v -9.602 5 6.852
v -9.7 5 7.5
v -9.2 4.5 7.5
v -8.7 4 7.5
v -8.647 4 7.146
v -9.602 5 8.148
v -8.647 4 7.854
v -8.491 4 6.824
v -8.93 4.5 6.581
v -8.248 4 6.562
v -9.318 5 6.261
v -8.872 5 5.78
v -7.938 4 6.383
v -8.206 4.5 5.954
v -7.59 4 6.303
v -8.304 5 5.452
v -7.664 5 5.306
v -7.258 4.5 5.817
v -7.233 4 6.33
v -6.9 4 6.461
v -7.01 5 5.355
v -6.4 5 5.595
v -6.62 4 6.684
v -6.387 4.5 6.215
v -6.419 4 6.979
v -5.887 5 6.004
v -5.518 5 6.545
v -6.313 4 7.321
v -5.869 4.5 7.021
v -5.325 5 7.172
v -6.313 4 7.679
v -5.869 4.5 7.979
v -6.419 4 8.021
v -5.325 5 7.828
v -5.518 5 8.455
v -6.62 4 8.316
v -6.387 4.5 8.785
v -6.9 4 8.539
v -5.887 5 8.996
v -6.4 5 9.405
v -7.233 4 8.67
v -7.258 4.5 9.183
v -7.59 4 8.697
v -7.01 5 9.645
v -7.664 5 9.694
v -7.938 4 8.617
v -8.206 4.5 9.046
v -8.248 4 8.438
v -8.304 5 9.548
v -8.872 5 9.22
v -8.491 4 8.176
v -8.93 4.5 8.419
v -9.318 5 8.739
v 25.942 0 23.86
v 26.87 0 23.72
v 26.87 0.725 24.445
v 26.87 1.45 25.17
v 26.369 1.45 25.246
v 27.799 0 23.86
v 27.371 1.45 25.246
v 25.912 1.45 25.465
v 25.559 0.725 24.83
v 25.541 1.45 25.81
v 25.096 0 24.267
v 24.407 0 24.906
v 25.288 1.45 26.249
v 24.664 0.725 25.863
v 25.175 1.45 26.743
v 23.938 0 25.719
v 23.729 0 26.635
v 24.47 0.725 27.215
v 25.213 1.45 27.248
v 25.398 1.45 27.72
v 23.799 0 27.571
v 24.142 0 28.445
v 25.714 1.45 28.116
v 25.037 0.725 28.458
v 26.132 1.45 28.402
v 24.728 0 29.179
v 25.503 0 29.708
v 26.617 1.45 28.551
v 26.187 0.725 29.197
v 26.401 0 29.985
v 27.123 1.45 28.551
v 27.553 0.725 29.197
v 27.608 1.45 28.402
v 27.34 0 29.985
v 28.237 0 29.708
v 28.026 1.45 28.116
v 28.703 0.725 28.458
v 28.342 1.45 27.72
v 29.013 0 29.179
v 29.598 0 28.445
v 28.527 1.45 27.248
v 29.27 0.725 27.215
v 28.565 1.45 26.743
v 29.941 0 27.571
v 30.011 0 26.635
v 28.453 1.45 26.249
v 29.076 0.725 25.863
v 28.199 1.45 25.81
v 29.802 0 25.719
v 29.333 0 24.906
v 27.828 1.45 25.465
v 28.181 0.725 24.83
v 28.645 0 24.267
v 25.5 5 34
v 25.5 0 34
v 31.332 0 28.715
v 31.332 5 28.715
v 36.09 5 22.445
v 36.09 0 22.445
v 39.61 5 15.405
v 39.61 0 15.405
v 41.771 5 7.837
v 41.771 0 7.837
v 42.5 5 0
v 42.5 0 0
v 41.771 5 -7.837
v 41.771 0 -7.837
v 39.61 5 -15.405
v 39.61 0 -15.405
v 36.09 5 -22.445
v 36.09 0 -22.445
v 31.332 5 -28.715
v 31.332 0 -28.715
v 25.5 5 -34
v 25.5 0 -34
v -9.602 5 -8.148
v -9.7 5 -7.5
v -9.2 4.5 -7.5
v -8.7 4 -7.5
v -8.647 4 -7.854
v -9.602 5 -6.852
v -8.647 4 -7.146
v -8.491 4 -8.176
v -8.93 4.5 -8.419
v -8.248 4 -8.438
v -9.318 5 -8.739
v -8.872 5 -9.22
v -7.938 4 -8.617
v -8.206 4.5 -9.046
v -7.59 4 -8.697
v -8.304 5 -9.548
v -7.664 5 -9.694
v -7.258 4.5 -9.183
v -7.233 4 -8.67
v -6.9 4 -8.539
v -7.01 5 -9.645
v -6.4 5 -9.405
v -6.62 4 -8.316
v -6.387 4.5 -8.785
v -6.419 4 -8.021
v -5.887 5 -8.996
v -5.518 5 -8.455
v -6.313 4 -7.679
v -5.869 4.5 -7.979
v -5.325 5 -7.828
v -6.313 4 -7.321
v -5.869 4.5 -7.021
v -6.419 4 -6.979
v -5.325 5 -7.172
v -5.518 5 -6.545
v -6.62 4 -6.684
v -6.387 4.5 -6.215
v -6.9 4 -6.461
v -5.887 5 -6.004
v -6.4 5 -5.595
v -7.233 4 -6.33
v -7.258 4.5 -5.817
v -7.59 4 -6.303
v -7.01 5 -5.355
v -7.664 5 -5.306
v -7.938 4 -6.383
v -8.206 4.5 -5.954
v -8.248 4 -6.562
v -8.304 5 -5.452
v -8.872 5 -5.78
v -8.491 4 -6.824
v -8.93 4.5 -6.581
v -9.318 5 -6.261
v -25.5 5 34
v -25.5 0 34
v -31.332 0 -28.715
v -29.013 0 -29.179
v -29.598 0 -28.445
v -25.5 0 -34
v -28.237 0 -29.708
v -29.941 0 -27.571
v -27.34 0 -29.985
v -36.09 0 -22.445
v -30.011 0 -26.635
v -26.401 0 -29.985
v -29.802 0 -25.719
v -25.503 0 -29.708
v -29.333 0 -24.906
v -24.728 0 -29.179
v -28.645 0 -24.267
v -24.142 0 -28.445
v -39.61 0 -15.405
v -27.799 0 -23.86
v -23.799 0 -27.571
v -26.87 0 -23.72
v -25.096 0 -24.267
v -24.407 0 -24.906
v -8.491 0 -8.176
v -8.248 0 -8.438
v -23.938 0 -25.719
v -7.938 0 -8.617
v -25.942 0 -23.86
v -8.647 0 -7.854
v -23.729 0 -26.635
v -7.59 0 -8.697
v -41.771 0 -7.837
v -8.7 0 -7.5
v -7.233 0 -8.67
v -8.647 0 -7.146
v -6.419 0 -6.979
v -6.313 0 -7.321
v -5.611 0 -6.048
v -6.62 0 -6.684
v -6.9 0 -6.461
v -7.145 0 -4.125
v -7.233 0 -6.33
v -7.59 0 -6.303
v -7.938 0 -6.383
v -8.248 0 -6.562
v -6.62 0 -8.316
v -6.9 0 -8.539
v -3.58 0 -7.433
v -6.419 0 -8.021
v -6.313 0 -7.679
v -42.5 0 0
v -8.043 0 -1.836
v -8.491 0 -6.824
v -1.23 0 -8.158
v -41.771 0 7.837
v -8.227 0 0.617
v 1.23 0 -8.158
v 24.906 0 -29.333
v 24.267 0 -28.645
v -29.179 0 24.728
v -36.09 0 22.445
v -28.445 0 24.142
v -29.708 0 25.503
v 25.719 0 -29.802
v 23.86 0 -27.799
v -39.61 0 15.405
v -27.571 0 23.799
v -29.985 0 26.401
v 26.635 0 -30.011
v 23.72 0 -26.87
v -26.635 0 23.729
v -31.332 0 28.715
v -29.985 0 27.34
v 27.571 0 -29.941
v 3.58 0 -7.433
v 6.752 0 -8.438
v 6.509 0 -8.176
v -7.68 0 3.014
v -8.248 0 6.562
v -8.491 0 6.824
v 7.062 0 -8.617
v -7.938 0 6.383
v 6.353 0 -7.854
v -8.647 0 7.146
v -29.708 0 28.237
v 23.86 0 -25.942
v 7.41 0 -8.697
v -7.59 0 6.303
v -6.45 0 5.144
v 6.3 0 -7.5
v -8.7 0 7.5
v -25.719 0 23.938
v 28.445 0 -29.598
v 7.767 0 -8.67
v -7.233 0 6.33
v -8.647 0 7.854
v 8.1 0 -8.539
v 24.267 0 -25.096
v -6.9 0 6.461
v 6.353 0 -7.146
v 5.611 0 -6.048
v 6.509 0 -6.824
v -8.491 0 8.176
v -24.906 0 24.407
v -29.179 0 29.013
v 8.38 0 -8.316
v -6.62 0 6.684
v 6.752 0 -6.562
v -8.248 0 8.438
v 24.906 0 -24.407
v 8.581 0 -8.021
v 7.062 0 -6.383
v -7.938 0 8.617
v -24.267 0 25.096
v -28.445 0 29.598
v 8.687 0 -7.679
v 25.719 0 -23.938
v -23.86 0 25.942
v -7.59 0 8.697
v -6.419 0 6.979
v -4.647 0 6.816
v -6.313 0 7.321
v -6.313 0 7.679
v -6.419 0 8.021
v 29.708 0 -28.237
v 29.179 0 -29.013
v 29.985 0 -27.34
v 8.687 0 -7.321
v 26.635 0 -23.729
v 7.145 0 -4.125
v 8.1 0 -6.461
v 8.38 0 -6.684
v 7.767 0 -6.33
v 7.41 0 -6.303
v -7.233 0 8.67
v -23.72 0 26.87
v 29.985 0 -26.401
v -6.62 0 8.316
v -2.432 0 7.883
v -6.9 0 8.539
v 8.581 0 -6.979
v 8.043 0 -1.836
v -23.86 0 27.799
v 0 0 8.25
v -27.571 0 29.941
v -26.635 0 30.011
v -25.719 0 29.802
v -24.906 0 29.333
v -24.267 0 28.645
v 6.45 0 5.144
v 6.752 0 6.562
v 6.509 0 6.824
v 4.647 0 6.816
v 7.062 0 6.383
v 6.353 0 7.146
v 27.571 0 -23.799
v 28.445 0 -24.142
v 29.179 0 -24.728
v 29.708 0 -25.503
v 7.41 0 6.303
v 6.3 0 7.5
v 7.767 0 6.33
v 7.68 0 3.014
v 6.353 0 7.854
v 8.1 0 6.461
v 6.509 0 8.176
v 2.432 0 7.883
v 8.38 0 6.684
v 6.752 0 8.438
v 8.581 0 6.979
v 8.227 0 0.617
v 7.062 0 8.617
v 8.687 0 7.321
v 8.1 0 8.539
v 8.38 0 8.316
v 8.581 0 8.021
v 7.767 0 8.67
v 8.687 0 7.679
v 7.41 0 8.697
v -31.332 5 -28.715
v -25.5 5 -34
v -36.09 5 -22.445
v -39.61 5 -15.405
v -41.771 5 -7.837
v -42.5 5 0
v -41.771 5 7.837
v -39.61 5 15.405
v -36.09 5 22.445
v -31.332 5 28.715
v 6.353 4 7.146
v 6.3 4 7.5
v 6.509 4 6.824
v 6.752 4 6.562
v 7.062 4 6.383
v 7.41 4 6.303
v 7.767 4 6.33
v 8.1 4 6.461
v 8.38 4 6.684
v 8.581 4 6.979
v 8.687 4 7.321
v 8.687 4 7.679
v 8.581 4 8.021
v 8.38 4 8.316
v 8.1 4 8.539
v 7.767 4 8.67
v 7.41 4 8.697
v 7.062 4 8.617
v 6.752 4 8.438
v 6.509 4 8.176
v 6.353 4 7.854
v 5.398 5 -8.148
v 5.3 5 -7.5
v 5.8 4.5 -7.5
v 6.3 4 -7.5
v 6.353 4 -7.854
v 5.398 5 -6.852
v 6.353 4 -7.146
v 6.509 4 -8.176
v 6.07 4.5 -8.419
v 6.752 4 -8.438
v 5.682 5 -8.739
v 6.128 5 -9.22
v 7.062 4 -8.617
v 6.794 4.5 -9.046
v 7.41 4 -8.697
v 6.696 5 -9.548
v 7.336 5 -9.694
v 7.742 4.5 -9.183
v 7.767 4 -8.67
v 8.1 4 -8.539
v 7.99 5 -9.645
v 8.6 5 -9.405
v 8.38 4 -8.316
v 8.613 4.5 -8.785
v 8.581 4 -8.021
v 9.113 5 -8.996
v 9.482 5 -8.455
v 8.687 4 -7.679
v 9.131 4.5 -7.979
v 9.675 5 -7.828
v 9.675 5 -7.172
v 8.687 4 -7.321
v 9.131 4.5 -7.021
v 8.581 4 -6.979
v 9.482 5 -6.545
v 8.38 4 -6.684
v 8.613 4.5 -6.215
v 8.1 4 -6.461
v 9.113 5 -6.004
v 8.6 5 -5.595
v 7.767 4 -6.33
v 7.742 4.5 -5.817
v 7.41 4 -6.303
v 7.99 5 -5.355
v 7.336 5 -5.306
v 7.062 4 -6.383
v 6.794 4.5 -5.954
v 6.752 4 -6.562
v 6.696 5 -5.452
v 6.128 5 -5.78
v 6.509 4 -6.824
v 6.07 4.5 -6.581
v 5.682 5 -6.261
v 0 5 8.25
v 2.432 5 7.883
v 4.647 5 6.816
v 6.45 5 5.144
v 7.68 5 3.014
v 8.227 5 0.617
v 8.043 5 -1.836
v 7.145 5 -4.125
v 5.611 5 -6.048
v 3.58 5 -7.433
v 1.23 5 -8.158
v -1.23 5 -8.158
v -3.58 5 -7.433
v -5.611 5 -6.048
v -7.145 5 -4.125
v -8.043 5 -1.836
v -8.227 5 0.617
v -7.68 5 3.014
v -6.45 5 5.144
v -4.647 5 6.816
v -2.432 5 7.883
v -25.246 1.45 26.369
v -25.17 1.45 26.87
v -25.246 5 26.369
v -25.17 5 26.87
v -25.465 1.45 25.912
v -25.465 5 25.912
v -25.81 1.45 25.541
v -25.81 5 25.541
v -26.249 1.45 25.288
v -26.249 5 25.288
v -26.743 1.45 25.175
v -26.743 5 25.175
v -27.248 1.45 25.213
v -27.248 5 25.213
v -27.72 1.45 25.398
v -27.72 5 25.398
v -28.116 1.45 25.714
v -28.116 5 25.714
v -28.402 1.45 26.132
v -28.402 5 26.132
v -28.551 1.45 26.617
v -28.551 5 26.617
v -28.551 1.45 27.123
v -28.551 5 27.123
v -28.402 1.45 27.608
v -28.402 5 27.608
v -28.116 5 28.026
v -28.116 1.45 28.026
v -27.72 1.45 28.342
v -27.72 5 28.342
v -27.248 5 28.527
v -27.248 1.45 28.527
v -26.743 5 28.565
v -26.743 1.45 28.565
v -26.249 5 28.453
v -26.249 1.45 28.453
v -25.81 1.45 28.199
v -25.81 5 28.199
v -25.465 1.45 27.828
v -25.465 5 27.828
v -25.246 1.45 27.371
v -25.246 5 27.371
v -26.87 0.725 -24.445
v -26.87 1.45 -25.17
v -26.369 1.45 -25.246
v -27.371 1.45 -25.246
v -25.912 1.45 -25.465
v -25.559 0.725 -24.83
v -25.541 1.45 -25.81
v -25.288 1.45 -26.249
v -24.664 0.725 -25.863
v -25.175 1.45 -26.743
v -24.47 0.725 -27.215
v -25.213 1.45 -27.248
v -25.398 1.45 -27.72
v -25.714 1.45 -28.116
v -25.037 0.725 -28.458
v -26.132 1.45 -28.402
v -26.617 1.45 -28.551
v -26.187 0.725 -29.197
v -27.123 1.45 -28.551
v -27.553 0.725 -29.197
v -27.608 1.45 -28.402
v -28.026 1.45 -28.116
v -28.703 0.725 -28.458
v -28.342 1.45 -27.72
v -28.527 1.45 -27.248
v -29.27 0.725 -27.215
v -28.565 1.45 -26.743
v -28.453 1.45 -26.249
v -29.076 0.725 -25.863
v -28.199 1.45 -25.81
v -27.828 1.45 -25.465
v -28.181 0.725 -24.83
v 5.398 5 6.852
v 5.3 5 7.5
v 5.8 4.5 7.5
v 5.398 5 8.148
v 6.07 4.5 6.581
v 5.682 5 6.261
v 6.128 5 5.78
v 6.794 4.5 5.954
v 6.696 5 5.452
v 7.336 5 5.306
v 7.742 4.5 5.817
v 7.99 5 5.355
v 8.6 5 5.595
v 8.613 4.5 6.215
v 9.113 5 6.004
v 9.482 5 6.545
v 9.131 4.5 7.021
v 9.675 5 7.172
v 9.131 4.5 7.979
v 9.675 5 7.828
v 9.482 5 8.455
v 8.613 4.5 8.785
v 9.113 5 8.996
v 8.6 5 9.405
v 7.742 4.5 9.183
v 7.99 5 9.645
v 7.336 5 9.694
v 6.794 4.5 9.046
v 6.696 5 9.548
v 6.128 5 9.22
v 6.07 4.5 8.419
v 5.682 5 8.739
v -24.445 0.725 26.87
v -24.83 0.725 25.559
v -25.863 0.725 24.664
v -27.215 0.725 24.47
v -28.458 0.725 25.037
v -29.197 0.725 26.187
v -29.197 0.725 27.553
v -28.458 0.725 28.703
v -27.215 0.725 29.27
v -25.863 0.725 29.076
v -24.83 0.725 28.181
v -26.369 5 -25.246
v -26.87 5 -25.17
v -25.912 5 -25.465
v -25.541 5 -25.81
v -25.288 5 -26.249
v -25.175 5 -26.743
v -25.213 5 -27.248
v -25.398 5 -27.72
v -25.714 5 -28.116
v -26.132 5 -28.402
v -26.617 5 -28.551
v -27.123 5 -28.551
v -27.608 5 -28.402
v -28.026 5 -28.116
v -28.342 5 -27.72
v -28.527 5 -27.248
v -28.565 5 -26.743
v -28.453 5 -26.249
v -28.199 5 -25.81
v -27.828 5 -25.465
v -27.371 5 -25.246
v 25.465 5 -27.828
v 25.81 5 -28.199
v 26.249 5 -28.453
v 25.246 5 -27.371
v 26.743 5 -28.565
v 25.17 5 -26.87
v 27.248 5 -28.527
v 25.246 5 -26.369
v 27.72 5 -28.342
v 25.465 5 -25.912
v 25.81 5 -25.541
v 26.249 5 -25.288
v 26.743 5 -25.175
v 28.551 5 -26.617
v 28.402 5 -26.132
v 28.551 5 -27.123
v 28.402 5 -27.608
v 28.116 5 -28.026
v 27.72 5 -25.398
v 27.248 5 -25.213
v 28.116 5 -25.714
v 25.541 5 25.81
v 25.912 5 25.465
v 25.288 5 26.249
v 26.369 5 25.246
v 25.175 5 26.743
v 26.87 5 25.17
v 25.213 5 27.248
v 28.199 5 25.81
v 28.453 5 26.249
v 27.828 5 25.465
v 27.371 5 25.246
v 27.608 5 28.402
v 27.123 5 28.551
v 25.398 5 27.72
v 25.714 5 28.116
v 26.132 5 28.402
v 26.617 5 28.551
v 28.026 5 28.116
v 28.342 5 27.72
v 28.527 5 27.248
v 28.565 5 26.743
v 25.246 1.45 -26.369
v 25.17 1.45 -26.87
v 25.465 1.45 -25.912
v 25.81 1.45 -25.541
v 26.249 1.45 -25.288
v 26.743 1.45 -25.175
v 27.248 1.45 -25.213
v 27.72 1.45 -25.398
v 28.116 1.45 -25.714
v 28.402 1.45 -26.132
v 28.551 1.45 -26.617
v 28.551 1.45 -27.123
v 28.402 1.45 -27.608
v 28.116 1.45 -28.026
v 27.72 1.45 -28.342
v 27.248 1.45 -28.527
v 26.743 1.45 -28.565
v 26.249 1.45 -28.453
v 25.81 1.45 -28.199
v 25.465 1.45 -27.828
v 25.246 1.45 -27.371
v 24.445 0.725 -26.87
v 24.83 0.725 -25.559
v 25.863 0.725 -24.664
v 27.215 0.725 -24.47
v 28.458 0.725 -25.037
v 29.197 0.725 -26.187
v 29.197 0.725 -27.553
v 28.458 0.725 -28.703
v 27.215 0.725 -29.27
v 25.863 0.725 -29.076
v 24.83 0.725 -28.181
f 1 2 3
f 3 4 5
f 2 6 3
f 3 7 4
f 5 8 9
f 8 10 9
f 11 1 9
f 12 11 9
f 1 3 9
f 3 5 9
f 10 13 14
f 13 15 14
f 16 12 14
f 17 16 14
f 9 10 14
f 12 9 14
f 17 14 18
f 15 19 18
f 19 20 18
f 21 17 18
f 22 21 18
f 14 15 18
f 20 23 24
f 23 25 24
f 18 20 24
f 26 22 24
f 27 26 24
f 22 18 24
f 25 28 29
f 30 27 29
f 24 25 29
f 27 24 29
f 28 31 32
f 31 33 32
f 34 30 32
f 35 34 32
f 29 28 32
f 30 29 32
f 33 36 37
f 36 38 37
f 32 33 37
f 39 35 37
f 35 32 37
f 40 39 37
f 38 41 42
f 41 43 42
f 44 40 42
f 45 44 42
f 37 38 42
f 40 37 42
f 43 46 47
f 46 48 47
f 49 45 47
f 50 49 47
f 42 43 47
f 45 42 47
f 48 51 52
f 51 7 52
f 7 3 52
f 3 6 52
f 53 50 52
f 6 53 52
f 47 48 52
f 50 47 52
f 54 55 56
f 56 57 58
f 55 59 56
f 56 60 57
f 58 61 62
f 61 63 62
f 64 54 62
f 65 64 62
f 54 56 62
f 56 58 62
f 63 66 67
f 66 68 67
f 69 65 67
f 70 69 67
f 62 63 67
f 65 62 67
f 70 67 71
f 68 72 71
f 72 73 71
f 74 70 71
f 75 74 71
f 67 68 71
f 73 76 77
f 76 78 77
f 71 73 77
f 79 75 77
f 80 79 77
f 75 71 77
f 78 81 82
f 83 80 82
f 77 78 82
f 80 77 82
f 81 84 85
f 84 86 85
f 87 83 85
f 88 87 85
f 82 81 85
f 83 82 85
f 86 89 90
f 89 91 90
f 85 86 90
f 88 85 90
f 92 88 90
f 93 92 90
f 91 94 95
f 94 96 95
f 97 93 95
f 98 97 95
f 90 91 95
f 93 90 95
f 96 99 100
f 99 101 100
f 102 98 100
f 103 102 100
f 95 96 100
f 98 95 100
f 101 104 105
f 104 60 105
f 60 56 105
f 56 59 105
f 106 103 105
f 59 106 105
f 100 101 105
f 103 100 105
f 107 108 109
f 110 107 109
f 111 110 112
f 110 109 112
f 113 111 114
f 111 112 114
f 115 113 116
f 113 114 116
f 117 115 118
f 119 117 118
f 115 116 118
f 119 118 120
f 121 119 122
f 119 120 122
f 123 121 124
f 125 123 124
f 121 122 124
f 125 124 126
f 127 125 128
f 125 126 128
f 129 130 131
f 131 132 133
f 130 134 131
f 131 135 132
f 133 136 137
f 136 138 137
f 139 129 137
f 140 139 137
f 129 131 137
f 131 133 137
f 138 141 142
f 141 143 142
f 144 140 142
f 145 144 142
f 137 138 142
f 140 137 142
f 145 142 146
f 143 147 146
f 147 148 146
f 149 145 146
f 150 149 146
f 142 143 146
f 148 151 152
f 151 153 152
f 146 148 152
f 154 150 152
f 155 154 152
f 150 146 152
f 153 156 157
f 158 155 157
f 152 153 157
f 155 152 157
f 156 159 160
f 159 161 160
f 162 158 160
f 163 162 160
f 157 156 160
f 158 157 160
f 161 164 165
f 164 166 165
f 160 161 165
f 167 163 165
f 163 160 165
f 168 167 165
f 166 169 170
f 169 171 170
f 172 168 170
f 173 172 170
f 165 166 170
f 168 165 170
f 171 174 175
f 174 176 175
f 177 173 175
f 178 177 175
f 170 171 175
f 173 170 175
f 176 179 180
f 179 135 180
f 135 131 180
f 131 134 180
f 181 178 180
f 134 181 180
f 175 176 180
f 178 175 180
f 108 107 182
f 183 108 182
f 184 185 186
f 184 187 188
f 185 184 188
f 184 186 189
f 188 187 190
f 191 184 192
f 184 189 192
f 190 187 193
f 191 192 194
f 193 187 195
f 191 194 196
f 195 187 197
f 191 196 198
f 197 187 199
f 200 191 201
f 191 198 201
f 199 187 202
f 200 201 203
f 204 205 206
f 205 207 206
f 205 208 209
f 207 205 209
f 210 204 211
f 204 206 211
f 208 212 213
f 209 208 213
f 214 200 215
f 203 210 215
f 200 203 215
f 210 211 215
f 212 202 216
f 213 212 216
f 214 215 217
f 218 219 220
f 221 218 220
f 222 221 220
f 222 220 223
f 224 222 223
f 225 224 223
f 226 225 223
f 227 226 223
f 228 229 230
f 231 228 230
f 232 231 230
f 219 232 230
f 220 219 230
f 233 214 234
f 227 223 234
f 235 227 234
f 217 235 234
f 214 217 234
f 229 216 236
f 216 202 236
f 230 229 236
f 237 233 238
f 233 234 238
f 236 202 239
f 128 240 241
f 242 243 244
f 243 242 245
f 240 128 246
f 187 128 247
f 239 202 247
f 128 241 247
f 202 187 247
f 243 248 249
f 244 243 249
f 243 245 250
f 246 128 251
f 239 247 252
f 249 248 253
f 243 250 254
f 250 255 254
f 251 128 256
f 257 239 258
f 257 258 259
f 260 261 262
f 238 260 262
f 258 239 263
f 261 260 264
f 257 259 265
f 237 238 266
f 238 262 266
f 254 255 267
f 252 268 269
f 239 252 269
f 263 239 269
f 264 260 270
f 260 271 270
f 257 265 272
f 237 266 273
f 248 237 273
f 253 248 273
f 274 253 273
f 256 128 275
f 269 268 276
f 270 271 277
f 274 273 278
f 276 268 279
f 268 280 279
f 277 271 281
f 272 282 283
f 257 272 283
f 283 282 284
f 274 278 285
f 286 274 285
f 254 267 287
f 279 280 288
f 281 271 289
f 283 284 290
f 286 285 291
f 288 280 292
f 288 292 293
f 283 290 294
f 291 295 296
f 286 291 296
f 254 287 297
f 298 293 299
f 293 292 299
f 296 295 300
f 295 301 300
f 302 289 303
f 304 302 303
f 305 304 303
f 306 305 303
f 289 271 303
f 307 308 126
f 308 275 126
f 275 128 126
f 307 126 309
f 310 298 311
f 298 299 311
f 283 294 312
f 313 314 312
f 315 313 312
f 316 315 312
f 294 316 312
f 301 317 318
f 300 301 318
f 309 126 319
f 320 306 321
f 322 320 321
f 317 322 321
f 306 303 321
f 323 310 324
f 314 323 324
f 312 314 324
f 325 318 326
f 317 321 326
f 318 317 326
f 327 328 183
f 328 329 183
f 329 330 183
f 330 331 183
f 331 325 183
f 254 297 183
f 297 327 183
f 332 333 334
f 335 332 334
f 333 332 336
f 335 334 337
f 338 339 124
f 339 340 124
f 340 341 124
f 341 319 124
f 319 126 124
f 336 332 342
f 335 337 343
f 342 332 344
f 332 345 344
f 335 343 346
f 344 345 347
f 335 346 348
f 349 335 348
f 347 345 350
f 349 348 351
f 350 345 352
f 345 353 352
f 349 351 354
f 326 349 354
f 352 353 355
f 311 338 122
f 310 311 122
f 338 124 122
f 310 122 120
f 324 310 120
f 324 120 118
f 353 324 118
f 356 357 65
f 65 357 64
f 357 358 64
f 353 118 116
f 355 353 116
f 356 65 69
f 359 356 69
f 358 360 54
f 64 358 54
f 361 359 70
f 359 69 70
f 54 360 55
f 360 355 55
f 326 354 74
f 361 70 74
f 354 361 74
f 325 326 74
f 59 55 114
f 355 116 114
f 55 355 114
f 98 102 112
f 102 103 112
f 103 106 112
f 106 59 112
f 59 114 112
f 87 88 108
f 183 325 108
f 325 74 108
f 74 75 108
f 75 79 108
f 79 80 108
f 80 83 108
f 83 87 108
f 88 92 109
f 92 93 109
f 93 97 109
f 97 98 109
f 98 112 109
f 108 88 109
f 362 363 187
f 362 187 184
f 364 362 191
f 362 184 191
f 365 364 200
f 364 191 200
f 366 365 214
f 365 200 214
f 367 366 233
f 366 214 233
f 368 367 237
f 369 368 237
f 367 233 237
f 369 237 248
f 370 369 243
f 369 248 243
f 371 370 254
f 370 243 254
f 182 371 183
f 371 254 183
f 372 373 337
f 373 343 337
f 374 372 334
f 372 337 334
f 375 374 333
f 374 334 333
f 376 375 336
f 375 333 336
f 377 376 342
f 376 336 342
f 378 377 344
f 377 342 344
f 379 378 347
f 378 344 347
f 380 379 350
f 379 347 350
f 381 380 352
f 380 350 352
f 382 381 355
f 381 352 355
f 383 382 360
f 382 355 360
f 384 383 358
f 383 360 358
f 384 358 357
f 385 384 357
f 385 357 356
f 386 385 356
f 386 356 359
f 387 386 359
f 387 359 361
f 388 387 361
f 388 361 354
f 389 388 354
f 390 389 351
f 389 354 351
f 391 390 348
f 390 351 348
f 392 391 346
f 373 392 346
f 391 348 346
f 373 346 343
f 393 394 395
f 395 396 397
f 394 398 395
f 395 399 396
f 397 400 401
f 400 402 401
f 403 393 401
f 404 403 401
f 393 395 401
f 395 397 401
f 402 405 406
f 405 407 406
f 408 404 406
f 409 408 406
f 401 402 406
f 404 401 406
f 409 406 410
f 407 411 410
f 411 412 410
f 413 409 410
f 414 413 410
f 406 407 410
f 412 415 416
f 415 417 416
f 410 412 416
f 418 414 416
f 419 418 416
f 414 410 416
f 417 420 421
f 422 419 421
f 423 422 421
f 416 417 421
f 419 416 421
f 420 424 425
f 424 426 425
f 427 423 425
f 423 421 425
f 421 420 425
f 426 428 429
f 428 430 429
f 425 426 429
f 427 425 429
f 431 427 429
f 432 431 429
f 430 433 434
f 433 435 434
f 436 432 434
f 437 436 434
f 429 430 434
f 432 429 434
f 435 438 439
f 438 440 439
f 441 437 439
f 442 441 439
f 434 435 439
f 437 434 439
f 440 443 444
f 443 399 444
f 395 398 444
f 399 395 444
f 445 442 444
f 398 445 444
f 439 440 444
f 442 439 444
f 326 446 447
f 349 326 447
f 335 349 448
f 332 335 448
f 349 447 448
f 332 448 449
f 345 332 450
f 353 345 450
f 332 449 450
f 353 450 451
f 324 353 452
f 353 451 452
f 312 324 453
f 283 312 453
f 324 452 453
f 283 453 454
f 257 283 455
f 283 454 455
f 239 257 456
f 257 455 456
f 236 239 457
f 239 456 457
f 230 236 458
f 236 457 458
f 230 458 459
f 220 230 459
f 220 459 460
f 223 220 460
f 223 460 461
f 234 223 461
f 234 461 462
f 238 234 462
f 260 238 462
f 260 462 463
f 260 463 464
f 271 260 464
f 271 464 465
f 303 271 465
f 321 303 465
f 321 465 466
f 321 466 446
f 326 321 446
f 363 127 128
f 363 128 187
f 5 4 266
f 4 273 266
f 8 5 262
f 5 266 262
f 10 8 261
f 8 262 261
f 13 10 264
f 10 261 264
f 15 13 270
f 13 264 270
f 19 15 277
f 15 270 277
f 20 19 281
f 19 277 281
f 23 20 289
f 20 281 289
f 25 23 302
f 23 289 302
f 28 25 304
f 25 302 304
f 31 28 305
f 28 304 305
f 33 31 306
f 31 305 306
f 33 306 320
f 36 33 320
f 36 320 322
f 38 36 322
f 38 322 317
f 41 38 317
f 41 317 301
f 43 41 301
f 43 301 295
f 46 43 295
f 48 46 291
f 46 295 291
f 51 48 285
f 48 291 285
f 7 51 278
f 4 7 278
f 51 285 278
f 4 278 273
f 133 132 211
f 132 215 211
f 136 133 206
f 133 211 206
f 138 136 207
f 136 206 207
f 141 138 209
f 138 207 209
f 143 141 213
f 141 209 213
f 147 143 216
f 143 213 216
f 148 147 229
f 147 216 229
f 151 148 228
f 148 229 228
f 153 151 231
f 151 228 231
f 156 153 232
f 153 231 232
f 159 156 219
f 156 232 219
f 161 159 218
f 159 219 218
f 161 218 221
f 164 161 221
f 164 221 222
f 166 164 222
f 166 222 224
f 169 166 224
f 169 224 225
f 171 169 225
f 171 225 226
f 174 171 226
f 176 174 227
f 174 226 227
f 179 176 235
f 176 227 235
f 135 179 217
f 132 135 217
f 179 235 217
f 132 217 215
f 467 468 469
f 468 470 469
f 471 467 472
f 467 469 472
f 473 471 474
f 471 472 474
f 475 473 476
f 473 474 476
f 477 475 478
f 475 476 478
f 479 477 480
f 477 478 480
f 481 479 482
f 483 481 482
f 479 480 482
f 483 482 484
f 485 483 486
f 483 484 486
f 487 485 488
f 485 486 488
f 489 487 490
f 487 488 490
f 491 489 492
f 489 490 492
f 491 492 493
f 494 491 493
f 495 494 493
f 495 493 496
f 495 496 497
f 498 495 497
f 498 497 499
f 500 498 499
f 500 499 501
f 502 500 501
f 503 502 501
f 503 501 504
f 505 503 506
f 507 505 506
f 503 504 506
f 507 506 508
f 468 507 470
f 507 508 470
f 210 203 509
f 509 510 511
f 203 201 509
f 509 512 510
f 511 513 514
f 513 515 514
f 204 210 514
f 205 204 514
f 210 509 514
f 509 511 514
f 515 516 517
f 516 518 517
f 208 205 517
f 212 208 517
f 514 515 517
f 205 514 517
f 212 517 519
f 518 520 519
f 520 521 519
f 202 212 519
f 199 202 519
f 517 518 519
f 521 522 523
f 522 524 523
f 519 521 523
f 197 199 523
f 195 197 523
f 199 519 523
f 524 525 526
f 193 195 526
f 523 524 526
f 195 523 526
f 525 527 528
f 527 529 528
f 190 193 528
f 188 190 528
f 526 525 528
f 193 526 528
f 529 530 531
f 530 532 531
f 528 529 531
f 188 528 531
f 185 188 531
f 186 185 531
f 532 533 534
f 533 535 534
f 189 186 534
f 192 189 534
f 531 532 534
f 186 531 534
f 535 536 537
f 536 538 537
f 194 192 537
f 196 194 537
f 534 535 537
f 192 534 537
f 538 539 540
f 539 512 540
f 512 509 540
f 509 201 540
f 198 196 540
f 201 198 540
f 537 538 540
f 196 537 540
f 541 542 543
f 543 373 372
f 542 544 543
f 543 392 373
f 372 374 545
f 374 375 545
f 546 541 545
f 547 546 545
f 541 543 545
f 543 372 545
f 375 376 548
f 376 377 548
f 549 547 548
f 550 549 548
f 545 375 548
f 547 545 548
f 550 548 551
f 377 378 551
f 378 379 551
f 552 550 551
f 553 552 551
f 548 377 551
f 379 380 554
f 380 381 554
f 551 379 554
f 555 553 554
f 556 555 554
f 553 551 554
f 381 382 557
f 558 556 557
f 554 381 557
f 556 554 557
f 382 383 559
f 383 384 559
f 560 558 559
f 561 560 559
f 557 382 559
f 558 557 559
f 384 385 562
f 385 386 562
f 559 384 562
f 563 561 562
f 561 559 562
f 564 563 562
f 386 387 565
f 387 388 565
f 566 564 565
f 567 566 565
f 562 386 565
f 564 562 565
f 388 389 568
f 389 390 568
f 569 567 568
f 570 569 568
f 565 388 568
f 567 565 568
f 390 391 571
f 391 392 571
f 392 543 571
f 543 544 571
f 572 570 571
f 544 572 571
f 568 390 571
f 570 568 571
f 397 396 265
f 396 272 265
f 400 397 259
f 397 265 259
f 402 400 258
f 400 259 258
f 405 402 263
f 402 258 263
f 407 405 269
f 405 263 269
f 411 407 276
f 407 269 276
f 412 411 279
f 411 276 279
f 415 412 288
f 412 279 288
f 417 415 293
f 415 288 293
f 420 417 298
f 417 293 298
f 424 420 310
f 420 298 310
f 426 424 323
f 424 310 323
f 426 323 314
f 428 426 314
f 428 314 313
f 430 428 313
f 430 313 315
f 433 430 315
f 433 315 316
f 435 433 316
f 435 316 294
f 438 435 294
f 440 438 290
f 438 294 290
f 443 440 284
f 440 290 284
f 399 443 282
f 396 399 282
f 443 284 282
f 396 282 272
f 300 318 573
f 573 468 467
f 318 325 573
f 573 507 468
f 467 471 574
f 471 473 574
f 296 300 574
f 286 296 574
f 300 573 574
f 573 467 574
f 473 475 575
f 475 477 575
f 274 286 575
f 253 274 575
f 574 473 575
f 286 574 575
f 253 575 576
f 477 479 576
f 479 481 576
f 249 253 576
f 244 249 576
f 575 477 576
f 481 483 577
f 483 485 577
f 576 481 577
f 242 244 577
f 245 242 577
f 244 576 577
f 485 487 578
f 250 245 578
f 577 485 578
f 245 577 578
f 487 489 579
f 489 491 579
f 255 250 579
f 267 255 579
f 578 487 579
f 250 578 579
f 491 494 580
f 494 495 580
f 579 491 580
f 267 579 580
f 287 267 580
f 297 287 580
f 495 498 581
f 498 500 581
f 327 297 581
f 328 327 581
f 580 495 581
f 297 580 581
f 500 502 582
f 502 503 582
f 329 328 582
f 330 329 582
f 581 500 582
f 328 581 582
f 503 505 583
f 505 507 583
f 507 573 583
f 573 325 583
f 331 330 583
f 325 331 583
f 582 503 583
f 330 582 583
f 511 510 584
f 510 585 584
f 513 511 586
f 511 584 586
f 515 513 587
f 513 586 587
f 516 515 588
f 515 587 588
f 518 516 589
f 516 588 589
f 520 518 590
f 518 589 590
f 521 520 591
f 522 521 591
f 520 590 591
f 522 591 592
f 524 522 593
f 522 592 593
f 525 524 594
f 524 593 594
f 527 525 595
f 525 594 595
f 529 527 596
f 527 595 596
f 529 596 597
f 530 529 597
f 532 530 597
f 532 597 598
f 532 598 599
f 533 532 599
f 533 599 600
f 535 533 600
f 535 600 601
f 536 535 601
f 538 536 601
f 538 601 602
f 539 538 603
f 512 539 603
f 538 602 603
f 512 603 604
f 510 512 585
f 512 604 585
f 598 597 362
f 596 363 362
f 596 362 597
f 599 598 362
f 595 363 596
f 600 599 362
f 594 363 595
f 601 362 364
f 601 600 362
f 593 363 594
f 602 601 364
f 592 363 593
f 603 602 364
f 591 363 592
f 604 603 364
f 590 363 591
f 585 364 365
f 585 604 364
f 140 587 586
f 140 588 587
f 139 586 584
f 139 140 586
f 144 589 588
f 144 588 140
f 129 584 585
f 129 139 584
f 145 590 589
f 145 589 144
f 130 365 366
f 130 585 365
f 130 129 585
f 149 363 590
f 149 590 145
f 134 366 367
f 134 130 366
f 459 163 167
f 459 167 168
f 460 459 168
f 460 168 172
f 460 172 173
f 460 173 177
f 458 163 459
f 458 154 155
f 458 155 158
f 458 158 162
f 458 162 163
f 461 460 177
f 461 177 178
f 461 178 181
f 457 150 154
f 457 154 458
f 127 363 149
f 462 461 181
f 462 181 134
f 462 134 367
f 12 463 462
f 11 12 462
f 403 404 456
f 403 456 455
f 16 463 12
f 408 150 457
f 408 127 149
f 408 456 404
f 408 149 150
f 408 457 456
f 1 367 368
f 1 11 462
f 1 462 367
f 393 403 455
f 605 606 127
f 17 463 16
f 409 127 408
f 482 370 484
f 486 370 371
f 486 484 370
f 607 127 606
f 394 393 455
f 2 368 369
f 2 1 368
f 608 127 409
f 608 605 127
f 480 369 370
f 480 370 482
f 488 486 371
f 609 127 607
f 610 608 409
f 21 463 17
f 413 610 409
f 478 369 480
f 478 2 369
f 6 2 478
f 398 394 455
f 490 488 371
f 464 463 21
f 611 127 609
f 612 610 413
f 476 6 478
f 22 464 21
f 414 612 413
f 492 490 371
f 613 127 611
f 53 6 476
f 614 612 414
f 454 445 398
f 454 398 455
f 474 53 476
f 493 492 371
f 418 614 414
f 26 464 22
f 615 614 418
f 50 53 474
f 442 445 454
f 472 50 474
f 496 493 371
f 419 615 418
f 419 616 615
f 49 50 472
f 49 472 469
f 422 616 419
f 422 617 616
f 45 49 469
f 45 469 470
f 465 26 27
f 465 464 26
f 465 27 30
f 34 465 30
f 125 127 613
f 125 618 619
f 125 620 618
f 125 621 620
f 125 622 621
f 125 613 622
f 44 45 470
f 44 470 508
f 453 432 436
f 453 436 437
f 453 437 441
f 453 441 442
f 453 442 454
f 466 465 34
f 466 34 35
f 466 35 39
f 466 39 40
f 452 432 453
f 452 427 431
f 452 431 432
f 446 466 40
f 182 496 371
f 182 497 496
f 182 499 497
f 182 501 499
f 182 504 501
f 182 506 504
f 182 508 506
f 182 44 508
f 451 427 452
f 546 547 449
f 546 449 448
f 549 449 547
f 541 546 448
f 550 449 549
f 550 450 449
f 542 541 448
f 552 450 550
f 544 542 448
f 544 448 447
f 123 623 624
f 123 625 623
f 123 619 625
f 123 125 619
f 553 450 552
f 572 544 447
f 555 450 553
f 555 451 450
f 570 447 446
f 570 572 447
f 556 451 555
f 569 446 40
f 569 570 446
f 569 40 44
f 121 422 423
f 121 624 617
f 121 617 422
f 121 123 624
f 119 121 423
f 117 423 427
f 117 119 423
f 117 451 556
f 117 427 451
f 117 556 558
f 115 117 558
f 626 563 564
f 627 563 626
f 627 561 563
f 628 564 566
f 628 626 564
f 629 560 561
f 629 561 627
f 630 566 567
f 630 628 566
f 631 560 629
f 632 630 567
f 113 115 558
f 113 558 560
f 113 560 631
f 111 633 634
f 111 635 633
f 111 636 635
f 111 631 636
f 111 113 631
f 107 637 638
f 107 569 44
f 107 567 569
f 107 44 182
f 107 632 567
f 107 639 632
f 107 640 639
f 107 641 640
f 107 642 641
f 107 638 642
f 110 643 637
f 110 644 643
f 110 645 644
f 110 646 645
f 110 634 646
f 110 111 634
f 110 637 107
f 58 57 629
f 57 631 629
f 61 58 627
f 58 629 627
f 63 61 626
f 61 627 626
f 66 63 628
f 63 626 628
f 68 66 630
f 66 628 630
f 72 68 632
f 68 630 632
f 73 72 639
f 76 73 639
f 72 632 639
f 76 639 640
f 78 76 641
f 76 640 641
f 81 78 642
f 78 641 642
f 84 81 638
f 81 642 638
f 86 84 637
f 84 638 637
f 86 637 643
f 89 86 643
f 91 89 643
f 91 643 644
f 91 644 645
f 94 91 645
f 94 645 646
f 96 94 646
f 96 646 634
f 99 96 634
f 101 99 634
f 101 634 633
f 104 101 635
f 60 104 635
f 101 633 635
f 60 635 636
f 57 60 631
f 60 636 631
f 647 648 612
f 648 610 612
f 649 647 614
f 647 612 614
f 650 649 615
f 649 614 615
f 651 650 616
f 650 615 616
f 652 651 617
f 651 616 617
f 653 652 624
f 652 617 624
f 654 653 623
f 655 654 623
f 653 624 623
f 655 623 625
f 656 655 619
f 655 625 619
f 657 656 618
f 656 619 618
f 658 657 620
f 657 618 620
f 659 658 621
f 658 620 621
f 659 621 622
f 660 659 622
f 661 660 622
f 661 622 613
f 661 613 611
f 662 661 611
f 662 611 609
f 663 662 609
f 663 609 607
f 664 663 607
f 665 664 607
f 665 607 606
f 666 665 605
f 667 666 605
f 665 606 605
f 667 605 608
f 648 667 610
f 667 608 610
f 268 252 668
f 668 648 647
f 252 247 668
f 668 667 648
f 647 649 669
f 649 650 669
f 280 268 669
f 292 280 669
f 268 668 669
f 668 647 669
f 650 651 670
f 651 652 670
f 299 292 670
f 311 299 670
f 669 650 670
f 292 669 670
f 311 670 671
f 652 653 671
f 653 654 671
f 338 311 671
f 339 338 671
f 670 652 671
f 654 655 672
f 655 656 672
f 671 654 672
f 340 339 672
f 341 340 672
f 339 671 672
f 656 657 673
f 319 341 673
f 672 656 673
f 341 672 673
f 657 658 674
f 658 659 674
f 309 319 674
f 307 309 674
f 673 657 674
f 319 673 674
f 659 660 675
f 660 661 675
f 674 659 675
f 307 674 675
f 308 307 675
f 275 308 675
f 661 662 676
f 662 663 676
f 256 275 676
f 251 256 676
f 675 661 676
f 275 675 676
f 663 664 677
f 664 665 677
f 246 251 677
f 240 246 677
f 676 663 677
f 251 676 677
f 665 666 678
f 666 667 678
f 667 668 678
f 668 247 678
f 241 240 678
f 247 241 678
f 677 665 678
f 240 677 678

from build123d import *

# Parameters (mm, degrees)
SKETCH_1_R                   = 42.5
EXTRUDE_1_DEPTH              = 5
SKETCH_2_R                   = 8.25
CUT_EXTRUDE_1_DEPTH          = 61.311690409
HOLE_WIZARD_M2_1_D           = 2.4
HOLE_WIZARD_M2_1_CSINK_D     = 4.4
HOLE_WIZARD_M2_1_CSINK_ANGLE = 90
HOLE_WIZARD_M3_1_D           = 3.4
HOLE_WIZARD_M3_1_CSINK_D     = 6.3
HOLE_WIZARD_M3_1_CSINK_ANGLE = 90
PATTERN_CIRCULAR_1_COUNT     = 4
CUT_EXTRUDE_2_DEPTH          = 61.311690409


with BuildPart() as part:
    # 草圖1 → 填料-伸長1 (new body)
    with BuildSketch(Plane(origin=(0, 0, 0), x_dir=(1, 0, 0), z_dir=(0, 1, 0))):
        Circle(SKETCH_1_R)
    extrude(amount=EXTRUDE_1_DEPTH)

    # 草圖2 → 除料-伸長1 (cut, through all)
    with BuildSketch(Plane(origin=(0, 5, 0), x_dir=(1, 0, 0), z_dir=(0, 1, 0))):
        Circle(SKETCH_2_R)
    extrude(amount=-CUT_EXTRUDE_1_DEPTH, mode=Mode.SUBTRACT)

    # M2 錐坑平頭螺釘的錐孔1 (through all)
    with Locations(Plane(origin=(0, 5, 0), x_dir=(1, 0, 0), z_dir=(0, 1, 0))):
        with Locations((-7.5, 7.5), (7.5, 7.5), (7.5, -7.5), (-7.5, -7.5)):
            CounterSinkHole(HOLE_WIZARD_M2_1_D / 2, HOLE_WIZARD_M2_1_CSINK_D / 2, counter_sink_angle=HOLE_WIZARD_M2_1_CSINK_ANGLE)

    # M3 錐坑平頭螺釘的錐孔1 (through all)
    with Locations(Plane(origin=(0, 0, 0), x_dir=(-1, 0, 0), z_dir=(0, -1, 0))):
        with Locations((26.870057685, -26.870057685)):
            hole_wizard_m3_1 = CounterSinkHole(HOLE_WIZARD_M3_1_D / 2, HOLE_WIZARD_M3_1_CSINK_D / 2, counter_sink_angle=HOLE_WIZARD_M3_1_CSINK_ANGLE)

    # 環狀複製排列1: M3 錐坑平頭螺釘的錐孔1 ×4 about axis
    pattern_circular_1_axis = Axis((0, 0, 0), (0, 1, 0))
    for i in range(1, PATTERN_CIRCULAR_1_COUNT):
        add(hole_wizard_m3_1.rotate(pattern_circular_1_axis, i * 360 / PATTERN_CIRCULAR_1_COUNT), mode=Mode.SUBTRACT)

    # 草圖7 → 除料-伸長2 (cut, symmetric)
    with BuildSketch(Plane(origin=(0, 5, 0), x_dir=(1, 0, 0), z_dir=(0, 1, 0))):
        Polygon((240.207107839, -34), (25.5, -34), (-25.5, -34), (-240.207107839, -34), (-240.207107839, -463.414215679), (240.207107839, -463.414215679), align=None)
    cut_extrude_2 = extrude(amount=CUT_EXTRUDE_2_DEPTH, both=True, mode=Mode.SUBTRACT)

    # 鏡射1: 除料-伸長2 across plane
    add(cut_extrude_2.mirror(Plane.XY), mode=Mode.SUBTRACT)


solid = part.part
